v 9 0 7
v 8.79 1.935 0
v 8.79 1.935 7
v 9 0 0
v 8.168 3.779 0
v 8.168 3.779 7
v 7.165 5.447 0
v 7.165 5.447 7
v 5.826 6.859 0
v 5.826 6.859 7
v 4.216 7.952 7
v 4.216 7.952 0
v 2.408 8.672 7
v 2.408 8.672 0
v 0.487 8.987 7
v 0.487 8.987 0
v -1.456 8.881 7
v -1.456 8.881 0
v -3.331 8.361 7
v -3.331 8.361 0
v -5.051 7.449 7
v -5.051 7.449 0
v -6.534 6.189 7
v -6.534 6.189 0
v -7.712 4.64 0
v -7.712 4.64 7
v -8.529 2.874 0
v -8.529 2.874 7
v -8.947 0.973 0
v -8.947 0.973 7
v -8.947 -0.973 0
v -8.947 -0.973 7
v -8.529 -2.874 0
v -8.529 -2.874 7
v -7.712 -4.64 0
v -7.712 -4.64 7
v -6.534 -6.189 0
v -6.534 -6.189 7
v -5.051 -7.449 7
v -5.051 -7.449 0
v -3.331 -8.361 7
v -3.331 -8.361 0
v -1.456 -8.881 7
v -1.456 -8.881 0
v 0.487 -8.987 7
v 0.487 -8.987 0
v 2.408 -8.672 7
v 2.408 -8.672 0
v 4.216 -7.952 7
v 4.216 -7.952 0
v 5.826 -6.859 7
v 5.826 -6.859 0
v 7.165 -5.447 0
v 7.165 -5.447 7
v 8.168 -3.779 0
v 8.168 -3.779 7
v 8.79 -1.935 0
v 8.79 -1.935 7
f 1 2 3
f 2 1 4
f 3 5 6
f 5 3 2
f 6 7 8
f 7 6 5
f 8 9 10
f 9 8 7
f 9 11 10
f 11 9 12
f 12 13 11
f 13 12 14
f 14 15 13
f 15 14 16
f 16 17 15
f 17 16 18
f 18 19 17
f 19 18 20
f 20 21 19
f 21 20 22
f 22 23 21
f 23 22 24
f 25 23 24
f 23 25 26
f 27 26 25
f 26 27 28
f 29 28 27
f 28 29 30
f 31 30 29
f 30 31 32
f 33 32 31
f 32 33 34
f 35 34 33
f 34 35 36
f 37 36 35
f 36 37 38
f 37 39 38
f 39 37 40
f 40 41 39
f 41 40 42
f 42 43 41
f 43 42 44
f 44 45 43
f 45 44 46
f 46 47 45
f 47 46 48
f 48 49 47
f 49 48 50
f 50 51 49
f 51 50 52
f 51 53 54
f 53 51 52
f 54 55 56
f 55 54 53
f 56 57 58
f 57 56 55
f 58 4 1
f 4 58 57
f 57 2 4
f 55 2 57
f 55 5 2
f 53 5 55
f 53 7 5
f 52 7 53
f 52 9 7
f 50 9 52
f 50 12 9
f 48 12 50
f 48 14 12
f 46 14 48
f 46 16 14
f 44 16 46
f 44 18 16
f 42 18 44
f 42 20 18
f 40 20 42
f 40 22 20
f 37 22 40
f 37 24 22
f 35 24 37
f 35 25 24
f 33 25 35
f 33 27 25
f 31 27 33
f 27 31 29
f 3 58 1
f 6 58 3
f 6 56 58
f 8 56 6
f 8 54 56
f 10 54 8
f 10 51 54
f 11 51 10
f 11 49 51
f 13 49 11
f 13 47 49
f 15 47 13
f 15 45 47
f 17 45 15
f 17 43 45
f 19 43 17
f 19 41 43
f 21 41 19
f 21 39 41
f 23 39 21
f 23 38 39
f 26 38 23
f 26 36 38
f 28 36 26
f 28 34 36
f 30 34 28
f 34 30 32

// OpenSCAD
// Generated by SolidPython 1.0.1 on 2020-07-29 00:39:25


cylinder(h = 7, r1 = 9, r2 = 9);
/***********************************************
*********      SolidPython code:      **********
************************************************
 
# import packages: SolidPython
from solid import *
from solid.utils import *
from itertools import chain, combinations


class Resize:

    def __init__(self, scad_file):
        self.scad_file = scad_file
        #self.scad_file = import_scad(scad_file)
        # cone/cylinder param:
        self.r1 = 0
        self.r2 = 0
        self.h = 0
        # rectangular prism param:
        self.w = 0
        self.l = 0
        # ellipse param:
        self.r = 0

    # import OpenScad code (file name corresponds to shape)


    # classify shape + parameters
    def assign(self, param1, param2, param3):
        if self.scad_file == 'cone.scad':
            self.r1 = param1
            self.r2 = param2
            self.h = param3
        elif self.scad_file == 'cylinder.scad':
            self.r1 = param1
            self.r2 = param2
            self.h = param3
        elif self.scad_file == 'rectangularPrism.scad':
            self.h = param1
            self.l = param2
            self.w = param3
        else:
            self.r = param1
            self.h = param2

    # resize parameters
    def iterate(self):
        x = range(3, 20, 2)
        i = 1
        if self.scad_file == 'cone.scad':
            tempList = list(combinations(x, 2))
            for temp in tempList:
                param1 = temp[0]
                param2 = temp[1]
                filepath = 'produced_scad_files/' + 'cone' + str(param1) + '_' + str(param2) + '_' + '.scad'
                scad_render_to_file(cylinder(h=param1, r1=param2, r2=0), filepath)

        elif self.scad_file == 'cylinder.scad':
            tempList = list(combinations(x, 3))
            for temp in tempList:
                param1 = temp[0]
                param2 = temp[1]
                filepath = 'produced_scad_files/' + 'cylinder' + str(param1) + '_' + str(param2) + '_' + '.scad'
                scad_render_to_file(cylinder(h=param1, r1=param2, r2=param2), filepath)

        elif self.scad_file == 'rectangularPrism.scad':
            tempList = list(combinations(x, 3))
            for temp in tempList:
                param1 = temp[0]
                param2 = temp[1]
                param3 = temp[2]
                filepath = 'produced_scad_files/' + 'rectangularPrism' + str(param1) + '_' + str(param2) + '_' + str(
                    param3) + '.scad'
                scad_render_to_file(cube(size=(param1, param2, param3)), filepath)

        elif self.scad_file == 'ellipse.scad':
            tempList = list(combinations(x, 4))
            for temp in tempList:
                param1 = temp[0]
                param2 = temp[1]
                param3 = temp[2]
                param4 = temp[3]
                filepath = 'produced_scad_files/' + 'ellipse' + str(param1) + '_' + str(param2) + '_' + str(param3) + '_' + str(param4) + '.scad'
                scad_render_to_file(scale([param1, param2, param3])(sphere(r=param4)), filepath)

    def render_to_scadfile(self):
        scad_render_to_file(scad, 'example.scad') 
 
************************************************/
